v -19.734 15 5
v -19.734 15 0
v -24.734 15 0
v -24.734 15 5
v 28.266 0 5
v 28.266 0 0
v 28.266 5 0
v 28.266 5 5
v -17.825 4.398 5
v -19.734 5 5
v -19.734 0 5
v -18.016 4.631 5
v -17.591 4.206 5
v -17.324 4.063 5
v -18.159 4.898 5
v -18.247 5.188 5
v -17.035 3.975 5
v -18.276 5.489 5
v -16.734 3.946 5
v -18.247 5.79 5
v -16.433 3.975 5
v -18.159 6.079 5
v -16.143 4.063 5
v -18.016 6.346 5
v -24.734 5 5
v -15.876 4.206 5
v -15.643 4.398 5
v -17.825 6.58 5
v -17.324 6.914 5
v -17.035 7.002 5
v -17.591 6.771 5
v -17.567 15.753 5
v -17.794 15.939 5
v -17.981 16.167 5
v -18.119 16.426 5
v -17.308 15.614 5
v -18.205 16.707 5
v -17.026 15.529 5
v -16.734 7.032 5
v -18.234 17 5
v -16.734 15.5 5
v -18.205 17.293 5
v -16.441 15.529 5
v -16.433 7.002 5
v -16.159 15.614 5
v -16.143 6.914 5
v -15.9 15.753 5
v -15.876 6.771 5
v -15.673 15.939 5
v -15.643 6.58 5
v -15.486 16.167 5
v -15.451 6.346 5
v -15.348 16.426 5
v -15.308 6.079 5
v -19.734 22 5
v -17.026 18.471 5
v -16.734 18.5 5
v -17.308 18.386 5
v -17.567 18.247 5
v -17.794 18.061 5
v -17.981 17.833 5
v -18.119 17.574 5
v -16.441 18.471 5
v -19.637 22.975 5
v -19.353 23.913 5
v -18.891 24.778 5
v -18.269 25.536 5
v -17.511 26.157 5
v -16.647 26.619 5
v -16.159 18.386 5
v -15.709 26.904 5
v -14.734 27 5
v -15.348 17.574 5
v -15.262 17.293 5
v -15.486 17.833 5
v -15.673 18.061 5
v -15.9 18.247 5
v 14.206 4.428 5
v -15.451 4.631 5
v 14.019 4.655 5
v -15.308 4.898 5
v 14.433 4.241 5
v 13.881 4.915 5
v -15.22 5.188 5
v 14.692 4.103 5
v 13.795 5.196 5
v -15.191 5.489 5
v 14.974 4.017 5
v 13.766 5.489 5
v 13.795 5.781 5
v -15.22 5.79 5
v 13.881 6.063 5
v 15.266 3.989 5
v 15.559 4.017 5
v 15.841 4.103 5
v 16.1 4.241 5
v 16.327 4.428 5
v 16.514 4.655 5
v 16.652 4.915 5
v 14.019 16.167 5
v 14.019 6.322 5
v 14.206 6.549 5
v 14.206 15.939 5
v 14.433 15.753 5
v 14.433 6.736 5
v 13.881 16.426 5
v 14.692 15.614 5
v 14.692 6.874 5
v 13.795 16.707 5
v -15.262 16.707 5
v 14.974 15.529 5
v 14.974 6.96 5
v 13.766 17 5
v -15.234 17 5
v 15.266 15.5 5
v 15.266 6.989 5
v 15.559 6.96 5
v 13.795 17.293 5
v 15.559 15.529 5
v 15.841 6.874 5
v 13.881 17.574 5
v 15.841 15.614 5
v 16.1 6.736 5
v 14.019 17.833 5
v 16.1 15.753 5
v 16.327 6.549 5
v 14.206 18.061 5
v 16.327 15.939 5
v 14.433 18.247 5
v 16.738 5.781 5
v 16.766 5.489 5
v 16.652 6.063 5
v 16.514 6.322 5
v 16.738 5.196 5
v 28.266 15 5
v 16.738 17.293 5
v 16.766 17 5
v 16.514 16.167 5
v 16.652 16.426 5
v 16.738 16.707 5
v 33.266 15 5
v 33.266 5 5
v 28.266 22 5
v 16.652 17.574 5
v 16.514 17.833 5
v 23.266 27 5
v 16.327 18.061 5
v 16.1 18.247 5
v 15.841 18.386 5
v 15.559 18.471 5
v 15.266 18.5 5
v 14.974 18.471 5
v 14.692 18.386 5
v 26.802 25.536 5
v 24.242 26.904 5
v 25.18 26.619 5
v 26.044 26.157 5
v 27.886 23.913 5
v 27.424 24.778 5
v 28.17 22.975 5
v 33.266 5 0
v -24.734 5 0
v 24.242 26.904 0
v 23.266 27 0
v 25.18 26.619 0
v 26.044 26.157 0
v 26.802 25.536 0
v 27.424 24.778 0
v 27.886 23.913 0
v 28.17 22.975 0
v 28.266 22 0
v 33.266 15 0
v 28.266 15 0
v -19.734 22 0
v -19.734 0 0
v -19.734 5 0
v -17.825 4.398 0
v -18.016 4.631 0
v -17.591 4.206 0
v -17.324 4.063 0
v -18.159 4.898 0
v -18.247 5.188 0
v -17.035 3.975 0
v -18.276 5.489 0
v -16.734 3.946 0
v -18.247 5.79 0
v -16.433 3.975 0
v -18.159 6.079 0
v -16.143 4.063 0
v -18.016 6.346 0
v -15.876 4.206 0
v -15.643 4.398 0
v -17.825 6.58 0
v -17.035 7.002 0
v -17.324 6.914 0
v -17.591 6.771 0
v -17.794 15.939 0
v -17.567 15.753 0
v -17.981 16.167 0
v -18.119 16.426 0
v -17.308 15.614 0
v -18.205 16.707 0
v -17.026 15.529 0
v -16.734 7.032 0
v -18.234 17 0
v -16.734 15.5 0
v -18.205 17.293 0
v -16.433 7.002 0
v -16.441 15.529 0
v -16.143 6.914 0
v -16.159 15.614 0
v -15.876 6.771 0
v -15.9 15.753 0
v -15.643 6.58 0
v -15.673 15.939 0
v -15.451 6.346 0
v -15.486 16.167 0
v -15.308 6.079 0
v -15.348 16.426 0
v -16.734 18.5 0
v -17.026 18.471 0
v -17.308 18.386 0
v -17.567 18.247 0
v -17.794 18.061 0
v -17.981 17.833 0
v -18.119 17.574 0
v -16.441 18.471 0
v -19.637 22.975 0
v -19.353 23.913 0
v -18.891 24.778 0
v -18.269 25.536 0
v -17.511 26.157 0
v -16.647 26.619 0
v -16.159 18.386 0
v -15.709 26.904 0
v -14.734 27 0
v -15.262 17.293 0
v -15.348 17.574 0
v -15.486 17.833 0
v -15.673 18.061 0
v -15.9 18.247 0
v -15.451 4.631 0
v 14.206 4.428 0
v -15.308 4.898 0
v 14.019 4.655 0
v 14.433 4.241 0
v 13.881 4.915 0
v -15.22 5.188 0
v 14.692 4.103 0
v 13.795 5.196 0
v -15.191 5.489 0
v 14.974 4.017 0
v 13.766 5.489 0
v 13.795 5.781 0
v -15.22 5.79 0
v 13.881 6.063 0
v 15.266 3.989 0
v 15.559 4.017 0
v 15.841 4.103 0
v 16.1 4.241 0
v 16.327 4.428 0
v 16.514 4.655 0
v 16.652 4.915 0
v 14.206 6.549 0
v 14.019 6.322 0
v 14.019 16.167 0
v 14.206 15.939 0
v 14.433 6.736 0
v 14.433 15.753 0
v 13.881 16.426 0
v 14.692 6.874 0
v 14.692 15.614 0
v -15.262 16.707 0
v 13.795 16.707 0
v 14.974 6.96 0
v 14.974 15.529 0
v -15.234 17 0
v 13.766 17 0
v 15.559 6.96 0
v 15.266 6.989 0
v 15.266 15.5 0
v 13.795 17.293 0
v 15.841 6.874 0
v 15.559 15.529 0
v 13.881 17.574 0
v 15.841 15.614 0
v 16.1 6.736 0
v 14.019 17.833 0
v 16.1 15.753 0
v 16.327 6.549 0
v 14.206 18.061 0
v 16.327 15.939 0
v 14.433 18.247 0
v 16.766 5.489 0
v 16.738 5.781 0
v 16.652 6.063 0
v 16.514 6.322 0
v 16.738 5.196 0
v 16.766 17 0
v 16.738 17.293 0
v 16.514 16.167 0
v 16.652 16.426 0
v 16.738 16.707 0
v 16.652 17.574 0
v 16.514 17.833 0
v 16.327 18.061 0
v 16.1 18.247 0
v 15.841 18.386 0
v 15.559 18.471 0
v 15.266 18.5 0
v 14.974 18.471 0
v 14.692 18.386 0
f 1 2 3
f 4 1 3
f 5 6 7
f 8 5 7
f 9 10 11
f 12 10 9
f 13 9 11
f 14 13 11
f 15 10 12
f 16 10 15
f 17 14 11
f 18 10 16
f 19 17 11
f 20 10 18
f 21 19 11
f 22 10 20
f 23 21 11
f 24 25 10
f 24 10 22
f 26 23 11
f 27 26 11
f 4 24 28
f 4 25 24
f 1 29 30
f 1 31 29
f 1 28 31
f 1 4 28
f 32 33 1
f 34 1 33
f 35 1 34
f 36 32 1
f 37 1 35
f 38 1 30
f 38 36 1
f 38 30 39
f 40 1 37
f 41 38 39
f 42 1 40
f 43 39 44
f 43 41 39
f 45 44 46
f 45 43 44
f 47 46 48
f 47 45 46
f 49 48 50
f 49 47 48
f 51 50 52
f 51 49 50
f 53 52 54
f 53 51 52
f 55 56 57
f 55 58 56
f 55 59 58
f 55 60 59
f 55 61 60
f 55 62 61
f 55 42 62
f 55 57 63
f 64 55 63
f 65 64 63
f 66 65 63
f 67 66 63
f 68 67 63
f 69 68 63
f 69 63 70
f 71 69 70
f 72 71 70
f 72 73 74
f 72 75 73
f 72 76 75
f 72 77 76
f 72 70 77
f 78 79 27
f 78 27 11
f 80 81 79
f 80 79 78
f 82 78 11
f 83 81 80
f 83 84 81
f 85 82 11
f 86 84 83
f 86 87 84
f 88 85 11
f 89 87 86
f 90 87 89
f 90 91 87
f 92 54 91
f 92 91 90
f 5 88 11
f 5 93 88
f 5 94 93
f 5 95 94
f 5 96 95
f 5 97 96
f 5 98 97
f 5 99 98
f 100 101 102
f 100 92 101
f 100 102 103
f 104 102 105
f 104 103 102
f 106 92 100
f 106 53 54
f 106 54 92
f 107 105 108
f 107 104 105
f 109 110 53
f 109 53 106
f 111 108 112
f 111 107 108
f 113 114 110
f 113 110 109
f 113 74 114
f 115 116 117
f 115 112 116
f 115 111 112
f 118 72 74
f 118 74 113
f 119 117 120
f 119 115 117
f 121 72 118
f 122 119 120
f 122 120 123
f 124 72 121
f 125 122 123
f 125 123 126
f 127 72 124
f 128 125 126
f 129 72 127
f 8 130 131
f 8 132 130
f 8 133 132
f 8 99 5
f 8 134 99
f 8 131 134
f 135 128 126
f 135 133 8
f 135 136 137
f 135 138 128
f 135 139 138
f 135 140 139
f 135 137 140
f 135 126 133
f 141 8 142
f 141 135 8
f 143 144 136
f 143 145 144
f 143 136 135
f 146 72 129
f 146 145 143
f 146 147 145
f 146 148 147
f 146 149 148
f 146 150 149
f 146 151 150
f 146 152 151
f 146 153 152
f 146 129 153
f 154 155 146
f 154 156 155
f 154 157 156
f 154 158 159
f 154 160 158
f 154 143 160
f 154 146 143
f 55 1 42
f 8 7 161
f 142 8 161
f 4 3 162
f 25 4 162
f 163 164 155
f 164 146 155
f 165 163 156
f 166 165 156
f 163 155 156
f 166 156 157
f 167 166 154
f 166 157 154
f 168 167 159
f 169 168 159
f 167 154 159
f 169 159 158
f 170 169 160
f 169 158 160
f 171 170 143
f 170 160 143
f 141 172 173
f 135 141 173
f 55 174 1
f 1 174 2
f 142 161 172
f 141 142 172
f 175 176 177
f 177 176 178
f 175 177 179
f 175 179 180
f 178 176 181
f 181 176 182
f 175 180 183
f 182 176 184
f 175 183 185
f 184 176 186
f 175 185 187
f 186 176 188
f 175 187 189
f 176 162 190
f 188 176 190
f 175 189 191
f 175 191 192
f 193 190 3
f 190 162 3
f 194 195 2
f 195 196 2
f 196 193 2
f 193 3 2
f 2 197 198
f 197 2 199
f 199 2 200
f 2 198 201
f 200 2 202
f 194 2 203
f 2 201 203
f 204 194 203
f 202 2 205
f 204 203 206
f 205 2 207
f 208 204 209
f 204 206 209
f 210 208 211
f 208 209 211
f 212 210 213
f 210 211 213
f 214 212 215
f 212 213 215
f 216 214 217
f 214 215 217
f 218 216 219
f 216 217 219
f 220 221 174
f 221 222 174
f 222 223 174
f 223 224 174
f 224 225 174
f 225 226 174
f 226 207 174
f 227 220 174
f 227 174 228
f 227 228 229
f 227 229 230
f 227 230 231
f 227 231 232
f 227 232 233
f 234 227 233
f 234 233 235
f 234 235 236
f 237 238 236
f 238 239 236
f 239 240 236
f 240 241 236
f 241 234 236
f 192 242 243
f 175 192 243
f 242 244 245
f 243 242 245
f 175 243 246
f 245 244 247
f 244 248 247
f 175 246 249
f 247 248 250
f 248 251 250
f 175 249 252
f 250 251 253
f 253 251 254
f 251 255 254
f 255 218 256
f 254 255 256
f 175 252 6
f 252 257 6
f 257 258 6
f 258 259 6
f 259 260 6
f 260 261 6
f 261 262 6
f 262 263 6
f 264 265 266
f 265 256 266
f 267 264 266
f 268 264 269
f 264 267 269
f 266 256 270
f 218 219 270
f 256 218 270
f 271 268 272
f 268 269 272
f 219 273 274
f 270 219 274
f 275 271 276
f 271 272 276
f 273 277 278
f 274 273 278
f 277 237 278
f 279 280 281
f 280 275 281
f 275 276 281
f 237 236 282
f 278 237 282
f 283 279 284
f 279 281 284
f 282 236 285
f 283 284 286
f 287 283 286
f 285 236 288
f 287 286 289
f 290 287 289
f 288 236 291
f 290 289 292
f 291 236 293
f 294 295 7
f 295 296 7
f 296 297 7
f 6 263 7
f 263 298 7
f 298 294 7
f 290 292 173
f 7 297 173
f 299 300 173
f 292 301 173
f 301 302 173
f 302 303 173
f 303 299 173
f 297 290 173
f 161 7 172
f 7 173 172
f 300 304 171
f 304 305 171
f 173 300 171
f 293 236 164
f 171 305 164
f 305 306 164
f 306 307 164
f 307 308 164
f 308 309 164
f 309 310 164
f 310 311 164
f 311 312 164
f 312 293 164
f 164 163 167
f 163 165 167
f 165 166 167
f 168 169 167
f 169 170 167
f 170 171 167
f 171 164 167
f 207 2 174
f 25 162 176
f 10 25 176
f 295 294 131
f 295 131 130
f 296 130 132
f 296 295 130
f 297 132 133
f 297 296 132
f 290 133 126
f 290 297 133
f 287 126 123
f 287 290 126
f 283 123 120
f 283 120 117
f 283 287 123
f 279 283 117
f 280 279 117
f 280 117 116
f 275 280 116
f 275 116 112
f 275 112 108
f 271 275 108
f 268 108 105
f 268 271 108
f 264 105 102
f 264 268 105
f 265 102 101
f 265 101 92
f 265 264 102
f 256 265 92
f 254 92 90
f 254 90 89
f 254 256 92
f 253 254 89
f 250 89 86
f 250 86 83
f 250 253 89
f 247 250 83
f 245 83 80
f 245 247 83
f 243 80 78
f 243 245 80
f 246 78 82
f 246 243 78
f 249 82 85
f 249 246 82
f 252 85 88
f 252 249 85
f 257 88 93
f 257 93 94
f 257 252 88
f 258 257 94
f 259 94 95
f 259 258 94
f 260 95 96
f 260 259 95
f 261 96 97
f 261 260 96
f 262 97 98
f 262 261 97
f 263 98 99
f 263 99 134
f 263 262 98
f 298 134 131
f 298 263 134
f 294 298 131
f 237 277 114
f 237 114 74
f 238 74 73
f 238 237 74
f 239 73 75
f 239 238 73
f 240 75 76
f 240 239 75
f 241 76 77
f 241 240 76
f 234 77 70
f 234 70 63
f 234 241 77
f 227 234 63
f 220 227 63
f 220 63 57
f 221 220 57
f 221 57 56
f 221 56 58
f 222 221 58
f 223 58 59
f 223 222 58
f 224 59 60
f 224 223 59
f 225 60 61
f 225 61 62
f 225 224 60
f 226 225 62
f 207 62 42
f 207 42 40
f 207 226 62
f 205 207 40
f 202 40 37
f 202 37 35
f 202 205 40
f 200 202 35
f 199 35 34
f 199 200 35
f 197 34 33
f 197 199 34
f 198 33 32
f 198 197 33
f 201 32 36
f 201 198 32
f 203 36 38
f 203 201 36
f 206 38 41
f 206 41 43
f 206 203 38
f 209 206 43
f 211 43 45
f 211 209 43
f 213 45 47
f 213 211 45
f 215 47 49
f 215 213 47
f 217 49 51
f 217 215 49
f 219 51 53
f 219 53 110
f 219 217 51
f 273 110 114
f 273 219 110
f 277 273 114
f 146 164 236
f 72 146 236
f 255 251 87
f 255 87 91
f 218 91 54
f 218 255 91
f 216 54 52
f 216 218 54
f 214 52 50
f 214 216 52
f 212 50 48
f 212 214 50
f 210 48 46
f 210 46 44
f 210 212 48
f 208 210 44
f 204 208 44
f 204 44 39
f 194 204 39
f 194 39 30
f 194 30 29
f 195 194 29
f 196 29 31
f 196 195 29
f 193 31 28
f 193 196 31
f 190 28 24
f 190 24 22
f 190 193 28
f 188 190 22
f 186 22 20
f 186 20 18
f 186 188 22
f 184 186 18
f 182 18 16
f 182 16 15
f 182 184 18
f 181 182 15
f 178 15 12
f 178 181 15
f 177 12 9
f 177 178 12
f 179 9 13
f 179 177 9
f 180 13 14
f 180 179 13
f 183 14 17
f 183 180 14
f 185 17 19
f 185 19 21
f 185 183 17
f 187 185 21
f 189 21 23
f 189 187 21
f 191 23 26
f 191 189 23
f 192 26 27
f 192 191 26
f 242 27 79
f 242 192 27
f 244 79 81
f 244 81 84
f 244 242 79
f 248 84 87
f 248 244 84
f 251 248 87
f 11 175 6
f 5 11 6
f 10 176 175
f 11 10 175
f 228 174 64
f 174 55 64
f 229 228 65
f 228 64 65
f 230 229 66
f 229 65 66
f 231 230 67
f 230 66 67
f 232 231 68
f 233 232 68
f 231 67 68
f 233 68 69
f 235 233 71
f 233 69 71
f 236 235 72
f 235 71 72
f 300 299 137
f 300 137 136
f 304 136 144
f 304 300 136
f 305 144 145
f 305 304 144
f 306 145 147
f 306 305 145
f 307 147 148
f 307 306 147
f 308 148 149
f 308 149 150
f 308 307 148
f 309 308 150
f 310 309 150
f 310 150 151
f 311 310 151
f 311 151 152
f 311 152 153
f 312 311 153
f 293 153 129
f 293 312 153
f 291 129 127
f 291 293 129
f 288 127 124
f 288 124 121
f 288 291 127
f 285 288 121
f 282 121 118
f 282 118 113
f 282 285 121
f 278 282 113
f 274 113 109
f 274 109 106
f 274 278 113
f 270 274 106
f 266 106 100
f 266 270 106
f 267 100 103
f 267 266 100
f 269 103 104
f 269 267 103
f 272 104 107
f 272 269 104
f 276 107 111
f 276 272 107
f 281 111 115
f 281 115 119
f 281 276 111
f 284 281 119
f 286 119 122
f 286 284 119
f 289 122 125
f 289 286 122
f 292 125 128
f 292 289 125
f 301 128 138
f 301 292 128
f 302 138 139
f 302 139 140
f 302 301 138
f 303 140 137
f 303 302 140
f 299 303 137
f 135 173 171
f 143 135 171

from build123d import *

# Parameters (mm, degrees)
SKETCH1_R           = 1.5
SKETCH1_R_2         = 1.542918724
SKETCH1_R_3         = 1.500000001
BOSS_EXTRUDE1_DEPTH = 5
FILLET1_R           = 5
FILLET2_R           = 5


with BuildPart() as part:
    # Sketch1 → Boss-Extrude1 (new body)
    with BuildSketch(Plane.XY):
        Polygon((-19.733524355, 0), (28.266475645, 0), (28.266475645, 5), (33.266475645, 5), (33.266475645, 15), (28.266475645, 15), (28.266475645, 27), (-19.733524355, 27), (-19.733524355, 15), (-24.733524355, 15), (-24.733524355, 5), (-19.733524355, 5), align=None)
        with Locations((-16.733524355, 17)):
            Circle(SKETCH1_R, mode=Mode.SUBTRACT)
        with Locations((-16.733524356, 5.488599349)):
            Circle(SKETCH1_R_2, mode=Mode.SUBTRACT)
        with Locations((15.266475644, 17)):
            Circle(SKETCH1_R_3, mode=Mode.SUBTRACT)
        with Locations((15.266475644, 5.488599348)):
            Circle(SKETCH1_R_3, mode=Mode.SUBTRACT)
    extrude(amount=BOSS_EXTRUDE1_DEPTH)

    # Fillet1
    fillet1_edges = [part.edges().sort_by_distance(p)[0] for p in [
        (-19.733524355, 27, 2.5),
    ]]
    fillet(fillet1_edges, radius=FILLET1_R)

    # Fillet2
    fillet2_edges = [part.edges().sort_by_distance(p)[0] for p in [
        (28.266475645, 27, 2.5),
    ]]
    fillet(fillet2_edges, radius=FILLET2_R)


solid = part.part
